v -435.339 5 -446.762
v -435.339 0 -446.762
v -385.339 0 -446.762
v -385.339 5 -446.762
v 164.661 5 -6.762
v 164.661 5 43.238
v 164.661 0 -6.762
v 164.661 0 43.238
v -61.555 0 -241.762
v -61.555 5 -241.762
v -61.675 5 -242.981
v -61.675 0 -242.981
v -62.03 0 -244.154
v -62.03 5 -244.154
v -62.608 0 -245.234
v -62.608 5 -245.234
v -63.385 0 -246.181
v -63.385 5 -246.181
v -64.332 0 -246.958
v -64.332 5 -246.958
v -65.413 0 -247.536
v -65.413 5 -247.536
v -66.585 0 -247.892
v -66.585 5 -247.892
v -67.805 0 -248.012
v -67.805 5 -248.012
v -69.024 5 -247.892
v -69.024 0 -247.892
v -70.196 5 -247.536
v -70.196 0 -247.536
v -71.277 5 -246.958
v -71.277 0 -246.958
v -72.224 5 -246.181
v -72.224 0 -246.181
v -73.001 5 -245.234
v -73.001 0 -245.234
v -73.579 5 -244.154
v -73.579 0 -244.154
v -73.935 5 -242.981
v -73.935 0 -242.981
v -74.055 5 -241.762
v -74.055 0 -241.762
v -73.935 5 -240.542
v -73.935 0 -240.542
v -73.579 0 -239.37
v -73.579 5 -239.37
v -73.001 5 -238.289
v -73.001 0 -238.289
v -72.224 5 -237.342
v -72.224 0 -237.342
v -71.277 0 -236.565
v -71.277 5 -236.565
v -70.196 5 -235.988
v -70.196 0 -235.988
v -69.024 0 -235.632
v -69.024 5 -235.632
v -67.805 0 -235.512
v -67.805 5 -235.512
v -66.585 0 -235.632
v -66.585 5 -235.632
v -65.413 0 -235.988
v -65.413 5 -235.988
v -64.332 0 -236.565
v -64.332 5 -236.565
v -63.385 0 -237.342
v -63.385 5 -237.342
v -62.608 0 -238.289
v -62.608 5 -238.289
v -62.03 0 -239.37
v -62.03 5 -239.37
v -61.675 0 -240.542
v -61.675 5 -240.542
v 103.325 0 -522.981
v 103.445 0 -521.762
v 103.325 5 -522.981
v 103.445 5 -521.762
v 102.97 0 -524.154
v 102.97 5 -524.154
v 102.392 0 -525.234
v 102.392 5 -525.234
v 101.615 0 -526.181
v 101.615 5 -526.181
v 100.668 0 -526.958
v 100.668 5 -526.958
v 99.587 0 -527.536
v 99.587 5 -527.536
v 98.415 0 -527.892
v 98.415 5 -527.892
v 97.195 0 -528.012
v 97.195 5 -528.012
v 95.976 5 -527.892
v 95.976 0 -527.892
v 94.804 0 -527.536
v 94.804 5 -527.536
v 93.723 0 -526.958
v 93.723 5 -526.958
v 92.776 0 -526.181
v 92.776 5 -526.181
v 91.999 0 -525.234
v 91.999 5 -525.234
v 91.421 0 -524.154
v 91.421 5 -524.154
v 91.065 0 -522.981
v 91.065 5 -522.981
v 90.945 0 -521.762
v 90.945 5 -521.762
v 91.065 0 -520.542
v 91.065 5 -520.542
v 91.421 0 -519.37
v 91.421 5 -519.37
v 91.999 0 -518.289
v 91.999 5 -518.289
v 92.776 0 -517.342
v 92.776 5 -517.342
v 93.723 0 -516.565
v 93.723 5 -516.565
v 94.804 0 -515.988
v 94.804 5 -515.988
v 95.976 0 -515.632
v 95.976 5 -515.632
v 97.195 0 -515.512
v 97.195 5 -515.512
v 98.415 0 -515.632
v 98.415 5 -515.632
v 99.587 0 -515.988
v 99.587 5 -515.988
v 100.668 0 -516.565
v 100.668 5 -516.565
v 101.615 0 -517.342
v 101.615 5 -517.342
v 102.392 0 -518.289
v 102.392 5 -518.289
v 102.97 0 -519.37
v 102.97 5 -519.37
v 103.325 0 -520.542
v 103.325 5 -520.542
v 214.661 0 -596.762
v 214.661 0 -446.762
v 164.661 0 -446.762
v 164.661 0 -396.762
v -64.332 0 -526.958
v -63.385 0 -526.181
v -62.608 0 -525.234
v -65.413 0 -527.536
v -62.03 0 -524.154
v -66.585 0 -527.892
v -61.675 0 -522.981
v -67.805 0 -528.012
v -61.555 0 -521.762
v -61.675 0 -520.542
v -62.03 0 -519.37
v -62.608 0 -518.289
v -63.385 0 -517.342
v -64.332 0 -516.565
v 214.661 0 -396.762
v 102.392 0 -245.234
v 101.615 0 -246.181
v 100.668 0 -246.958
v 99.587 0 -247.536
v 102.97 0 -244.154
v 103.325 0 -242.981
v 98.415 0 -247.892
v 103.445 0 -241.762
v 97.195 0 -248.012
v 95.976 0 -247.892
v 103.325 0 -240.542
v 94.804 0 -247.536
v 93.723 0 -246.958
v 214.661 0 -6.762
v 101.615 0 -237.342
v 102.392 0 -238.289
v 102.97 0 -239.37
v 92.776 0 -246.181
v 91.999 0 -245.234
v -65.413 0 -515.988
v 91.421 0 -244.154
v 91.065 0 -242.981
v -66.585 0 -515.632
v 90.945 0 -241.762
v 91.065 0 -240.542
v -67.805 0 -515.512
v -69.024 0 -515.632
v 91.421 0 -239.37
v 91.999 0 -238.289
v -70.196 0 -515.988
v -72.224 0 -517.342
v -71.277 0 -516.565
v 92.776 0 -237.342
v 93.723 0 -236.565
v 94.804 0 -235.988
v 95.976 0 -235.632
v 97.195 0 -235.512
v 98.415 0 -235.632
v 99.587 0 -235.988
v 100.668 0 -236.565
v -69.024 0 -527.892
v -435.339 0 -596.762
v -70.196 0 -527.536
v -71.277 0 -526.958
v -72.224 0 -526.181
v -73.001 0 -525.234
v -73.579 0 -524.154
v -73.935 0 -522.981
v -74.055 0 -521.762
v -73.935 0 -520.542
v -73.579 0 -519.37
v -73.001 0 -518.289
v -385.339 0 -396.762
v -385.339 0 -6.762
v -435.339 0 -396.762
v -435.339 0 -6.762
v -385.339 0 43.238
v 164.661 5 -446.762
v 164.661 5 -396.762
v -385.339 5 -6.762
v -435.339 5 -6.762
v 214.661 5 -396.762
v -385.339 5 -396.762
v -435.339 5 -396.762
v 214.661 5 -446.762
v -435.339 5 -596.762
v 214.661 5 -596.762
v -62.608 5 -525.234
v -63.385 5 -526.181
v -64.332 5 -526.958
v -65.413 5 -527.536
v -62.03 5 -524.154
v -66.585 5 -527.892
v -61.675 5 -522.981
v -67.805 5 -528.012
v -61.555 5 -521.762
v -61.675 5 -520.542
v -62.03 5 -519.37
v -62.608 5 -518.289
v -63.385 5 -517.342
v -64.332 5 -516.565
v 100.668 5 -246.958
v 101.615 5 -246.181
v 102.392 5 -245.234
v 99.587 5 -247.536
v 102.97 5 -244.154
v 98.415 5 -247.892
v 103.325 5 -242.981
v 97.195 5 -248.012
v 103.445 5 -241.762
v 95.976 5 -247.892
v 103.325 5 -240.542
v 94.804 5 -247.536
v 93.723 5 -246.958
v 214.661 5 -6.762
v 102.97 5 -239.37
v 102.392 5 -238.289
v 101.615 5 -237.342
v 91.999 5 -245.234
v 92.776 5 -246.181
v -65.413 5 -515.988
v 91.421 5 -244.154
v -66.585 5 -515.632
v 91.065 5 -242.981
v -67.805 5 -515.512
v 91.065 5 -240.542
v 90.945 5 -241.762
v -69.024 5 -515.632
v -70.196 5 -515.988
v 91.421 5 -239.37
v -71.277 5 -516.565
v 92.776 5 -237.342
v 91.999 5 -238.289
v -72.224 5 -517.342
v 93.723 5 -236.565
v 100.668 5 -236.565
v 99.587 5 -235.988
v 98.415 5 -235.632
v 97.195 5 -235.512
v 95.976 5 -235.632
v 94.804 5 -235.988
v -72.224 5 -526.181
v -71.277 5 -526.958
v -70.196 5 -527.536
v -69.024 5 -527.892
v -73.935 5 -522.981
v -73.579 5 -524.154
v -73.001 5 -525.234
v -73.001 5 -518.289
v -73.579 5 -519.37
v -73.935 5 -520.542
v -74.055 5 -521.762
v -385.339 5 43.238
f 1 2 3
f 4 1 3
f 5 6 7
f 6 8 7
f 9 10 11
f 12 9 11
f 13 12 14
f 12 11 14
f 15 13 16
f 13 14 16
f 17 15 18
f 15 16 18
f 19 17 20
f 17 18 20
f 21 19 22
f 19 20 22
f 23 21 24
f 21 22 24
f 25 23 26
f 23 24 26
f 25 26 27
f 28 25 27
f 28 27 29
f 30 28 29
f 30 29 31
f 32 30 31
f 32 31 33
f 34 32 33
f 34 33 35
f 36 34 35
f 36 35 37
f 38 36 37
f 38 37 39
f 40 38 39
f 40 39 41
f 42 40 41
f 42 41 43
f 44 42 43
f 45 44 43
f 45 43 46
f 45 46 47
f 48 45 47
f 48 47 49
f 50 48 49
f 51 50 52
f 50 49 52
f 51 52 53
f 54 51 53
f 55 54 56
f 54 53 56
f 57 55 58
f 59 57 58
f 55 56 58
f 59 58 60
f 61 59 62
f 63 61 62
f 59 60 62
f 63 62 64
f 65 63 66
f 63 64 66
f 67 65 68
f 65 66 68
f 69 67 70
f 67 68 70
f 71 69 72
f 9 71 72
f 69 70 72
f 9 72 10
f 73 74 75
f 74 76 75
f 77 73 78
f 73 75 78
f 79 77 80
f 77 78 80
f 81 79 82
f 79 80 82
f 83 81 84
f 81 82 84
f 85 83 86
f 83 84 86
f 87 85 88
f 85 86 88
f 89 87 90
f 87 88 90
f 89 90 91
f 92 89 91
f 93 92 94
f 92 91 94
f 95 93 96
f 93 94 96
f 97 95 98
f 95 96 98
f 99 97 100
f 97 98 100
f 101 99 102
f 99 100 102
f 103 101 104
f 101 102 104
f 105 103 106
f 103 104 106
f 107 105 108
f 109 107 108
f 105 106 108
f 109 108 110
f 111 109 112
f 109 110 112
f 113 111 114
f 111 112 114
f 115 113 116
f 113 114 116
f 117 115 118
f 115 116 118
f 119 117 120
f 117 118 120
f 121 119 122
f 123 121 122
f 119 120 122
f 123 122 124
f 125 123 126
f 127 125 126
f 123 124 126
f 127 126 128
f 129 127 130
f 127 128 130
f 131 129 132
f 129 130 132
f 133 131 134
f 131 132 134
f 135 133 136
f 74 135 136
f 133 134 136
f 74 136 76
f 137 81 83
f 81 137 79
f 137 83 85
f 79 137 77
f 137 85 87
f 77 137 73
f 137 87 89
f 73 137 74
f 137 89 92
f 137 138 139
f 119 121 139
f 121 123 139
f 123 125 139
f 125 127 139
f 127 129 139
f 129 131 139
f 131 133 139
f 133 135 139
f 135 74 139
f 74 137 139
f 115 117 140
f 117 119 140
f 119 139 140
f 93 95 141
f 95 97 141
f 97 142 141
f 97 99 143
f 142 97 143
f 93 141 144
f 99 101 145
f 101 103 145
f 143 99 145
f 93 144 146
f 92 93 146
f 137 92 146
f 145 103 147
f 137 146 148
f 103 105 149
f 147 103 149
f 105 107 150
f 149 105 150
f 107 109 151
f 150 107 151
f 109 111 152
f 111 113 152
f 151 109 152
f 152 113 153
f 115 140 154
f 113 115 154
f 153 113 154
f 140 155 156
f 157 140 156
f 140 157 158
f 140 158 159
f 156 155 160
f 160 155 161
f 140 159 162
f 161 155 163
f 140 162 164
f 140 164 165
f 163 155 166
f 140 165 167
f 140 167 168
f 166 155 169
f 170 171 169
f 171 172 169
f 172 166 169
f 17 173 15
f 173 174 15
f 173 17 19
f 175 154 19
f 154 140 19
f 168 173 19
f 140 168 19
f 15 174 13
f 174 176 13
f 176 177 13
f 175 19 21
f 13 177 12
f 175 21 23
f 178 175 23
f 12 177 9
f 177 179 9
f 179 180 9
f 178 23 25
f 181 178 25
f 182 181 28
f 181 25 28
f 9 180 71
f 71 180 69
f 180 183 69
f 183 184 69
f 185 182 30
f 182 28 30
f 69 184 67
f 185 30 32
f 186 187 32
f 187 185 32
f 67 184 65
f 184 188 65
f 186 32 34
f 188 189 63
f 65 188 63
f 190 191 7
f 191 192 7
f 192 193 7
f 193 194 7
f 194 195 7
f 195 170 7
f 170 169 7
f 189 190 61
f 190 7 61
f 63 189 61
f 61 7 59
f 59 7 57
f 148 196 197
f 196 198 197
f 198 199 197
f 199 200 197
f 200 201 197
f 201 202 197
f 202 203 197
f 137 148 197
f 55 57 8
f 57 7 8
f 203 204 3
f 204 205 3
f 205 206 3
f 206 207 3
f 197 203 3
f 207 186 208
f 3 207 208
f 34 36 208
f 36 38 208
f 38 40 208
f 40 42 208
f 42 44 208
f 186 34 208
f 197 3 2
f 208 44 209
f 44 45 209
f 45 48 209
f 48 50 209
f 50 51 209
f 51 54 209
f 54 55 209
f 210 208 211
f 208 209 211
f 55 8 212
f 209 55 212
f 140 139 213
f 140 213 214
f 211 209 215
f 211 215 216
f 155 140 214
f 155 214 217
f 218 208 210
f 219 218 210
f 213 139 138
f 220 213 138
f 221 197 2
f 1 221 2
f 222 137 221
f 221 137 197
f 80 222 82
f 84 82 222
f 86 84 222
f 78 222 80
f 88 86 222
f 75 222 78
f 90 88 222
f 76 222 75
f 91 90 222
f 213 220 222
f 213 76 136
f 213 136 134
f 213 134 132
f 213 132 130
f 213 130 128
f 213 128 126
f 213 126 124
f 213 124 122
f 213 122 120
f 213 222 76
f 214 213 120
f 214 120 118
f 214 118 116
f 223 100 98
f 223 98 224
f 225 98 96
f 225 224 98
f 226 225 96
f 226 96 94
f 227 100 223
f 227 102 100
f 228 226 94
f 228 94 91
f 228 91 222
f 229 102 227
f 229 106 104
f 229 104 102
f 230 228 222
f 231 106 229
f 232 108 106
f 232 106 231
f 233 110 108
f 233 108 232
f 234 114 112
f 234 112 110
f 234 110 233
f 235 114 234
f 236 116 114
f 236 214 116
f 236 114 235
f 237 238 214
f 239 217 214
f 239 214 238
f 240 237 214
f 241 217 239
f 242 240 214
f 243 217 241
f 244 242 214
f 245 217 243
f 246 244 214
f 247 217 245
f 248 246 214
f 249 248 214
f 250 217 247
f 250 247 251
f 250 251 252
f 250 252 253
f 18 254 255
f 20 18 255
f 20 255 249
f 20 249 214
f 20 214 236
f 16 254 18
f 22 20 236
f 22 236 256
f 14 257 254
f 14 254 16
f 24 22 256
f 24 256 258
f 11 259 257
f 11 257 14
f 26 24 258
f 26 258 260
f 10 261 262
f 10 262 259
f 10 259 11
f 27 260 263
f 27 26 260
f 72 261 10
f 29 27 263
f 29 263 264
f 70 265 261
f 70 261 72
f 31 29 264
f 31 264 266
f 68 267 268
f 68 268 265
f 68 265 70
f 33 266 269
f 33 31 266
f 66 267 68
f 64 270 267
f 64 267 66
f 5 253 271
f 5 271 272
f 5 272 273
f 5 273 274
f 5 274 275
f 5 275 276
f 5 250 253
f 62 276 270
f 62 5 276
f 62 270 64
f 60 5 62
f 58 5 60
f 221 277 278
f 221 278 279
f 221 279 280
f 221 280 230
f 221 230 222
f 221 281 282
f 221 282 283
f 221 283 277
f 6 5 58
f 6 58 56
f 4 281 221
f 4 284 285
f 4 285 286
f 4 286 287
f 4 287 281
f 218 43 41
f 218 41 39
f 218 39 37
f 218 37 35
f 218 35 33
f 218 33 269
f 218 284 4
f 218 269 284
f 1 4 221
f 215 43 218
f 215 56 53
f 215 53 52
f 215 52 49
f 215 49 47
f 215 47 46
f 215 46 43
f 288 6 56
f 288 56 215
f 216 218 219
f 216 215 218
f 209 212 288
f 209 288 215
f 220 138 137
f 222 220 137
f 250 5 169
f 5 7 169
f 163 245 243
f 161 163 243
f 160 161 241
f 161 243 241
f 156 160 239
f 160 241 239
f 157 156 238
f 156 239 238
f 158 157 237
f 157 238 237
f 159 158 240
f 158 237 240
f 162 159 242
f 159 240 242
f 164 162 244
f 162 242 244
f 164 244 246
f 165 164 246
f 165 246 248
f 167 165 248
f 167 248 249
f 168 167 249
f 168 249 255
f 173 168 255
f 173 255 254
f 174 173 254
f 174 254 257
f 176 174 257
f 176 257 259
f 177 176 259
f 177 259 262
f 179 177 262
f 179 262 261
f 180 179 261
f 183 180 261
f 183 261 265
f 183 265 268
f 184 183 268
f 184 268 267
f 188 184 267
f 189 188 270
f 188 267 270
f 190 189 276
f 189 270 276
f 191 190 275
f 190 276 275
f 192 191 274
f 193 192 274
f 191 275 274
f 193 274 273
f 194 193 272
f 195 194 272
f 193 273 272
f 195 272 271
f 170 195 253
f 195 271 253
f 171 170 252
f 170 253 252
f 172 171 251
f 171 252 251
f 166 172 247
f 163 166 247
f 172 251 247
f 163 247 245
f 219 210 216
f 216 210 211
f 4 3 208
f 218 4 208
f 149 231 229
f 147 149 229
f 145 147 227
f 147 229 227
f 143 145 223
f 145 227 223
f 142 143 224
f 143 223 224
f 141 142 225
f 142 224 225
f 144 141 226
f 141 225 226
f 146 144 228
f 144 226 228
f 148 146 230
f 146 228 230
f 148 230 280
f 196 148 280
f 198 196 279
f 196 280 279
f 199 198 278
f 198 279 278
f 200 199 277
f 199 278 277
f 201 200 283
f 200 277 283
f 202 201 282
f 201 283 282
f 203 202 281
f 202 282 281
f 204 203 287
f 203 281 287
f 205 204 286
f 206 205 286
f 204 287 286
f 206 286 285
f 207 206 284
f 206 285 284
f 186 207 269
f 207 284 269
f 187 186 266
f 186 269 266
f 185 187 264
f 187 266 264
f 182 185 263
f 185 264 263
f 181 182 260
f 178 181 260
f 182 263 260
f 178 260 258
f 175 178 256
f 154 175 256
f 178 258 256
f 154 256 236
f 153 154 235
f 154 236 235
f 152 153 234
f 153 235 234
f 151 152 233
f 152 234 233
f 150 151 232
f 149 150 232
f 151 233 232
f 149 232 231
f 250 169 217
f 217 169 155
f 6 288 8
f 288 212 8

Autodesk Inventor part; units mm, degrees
ref_plane "YZ Plane" through (0, 0, 0) normal (1, 0, 0) x (0, 1, 0)
ref_plane "XZ Plane" through (0, 0, 0) normal (0, 1, 0) x (-1, 0, 0)
ref_plane "XY Plane" through (0, 0, 0) normal (0, 0, 1) x (1, 0, 0)
sketch "Boceto2" plane through (0, 0, 0) normal (0, 1, 0) x (-1, 0, 0)
  line L0 (385.3386, 43.2382) -> (385.3386, -6.7618)
  line L1 (385.3386, -6.7618) -> (435.3386, -6.7618)
  line L2 (385.3386, -446.7618) -> (385.3386, -396.7618)
  line L3 (385.3386, -396.7618) -> (435.3386, -396.7618)
  line L4 (-164.6614, 43.2382) -> (-164.6614, -6.7618)
  line L5 (-164.6614, -6.7618) -> (-214.6614, -6.7618)
  line L6 (-164.6614, -446.7618) -> (-164.6614, -396.7618)
  line L7 (-164.6614, -396.7618) -> (-214.6614, -396.7618)
  line L8 (385.3386, 43.2382) -> (-164.6614, 43.2382)
  line L9 (435.3386, -396.7618) -> (435.3386, -6.7618)
  line L10 (-214.6614, -6.7618) -> (-214.6614, -396.7618)
  line L11 (-164.6614, -446.7618) -> (-214.6614, -446.7618)
  line L12 (-214.6614, -446.7618) -> (-214.6614, -596.7618)
  line L13 (-214.6614, -596.7618) -> (435.3386, -596.7618)
  line L14 (435.3386, -596.7618) -> (435.3386, -446.7618)
  line L15 (435.3386, -446.7618) -> (385.3386, -446.7618)
  point P0 (0, 0)
  dimension "d15" = 50
  dimension "d16" = 50
  dimension "d17" = 50
  dimension "d18" = 50
  dimension "d19" = 50
  dimension "d20" = 50
  dimension "d21" = 50
  dimension "d22" = 50
  dimension "d25" = 50
  dimension "d26" = 150
  dimension "d27" = 650
  dimension "d28" = 150
extrude "Extrusión2" add sketch "Boceto2" along normal blind 5
sketch "Boceto3" plane through (0, 5, 0) normal (0, 1, 0) x (1, 0, 0)
  arc A0 (-61.5546, 521.7618) -> (-74.0546, 521.7618) centre (-67.8046, 521.7618) ccw projected
  arc A1 (103.4454, 521.7618) -> (90.9454, 521.7618) centre (97.1954, 521.7618) ccw projected
  arc A2 (90.9454, 241.7618) -> (103.4454, 241.7618) centre (97.1954, 241.7618) ccw projected
  arc A3 (-74.0546, 241.7618) -> (-61.5546, 241.7618) centre (-67.8046, 241.7618) ccw projected
  circle A4 centre (-67.8046, 241.7618) radius 6.25
  circle A5 centre (97.1954, 241.7618) radius 6.25
  circle A6 centre (97.1954, 521.7618) radius 6.25
  circle A7 centre (-67.8046, 521.7618) radius 6.25
  point P0 (0, 0)
extrude "Extrusión3" cut sketch "Boceto3" against normal through all
properties material "Aluminio 6061"
